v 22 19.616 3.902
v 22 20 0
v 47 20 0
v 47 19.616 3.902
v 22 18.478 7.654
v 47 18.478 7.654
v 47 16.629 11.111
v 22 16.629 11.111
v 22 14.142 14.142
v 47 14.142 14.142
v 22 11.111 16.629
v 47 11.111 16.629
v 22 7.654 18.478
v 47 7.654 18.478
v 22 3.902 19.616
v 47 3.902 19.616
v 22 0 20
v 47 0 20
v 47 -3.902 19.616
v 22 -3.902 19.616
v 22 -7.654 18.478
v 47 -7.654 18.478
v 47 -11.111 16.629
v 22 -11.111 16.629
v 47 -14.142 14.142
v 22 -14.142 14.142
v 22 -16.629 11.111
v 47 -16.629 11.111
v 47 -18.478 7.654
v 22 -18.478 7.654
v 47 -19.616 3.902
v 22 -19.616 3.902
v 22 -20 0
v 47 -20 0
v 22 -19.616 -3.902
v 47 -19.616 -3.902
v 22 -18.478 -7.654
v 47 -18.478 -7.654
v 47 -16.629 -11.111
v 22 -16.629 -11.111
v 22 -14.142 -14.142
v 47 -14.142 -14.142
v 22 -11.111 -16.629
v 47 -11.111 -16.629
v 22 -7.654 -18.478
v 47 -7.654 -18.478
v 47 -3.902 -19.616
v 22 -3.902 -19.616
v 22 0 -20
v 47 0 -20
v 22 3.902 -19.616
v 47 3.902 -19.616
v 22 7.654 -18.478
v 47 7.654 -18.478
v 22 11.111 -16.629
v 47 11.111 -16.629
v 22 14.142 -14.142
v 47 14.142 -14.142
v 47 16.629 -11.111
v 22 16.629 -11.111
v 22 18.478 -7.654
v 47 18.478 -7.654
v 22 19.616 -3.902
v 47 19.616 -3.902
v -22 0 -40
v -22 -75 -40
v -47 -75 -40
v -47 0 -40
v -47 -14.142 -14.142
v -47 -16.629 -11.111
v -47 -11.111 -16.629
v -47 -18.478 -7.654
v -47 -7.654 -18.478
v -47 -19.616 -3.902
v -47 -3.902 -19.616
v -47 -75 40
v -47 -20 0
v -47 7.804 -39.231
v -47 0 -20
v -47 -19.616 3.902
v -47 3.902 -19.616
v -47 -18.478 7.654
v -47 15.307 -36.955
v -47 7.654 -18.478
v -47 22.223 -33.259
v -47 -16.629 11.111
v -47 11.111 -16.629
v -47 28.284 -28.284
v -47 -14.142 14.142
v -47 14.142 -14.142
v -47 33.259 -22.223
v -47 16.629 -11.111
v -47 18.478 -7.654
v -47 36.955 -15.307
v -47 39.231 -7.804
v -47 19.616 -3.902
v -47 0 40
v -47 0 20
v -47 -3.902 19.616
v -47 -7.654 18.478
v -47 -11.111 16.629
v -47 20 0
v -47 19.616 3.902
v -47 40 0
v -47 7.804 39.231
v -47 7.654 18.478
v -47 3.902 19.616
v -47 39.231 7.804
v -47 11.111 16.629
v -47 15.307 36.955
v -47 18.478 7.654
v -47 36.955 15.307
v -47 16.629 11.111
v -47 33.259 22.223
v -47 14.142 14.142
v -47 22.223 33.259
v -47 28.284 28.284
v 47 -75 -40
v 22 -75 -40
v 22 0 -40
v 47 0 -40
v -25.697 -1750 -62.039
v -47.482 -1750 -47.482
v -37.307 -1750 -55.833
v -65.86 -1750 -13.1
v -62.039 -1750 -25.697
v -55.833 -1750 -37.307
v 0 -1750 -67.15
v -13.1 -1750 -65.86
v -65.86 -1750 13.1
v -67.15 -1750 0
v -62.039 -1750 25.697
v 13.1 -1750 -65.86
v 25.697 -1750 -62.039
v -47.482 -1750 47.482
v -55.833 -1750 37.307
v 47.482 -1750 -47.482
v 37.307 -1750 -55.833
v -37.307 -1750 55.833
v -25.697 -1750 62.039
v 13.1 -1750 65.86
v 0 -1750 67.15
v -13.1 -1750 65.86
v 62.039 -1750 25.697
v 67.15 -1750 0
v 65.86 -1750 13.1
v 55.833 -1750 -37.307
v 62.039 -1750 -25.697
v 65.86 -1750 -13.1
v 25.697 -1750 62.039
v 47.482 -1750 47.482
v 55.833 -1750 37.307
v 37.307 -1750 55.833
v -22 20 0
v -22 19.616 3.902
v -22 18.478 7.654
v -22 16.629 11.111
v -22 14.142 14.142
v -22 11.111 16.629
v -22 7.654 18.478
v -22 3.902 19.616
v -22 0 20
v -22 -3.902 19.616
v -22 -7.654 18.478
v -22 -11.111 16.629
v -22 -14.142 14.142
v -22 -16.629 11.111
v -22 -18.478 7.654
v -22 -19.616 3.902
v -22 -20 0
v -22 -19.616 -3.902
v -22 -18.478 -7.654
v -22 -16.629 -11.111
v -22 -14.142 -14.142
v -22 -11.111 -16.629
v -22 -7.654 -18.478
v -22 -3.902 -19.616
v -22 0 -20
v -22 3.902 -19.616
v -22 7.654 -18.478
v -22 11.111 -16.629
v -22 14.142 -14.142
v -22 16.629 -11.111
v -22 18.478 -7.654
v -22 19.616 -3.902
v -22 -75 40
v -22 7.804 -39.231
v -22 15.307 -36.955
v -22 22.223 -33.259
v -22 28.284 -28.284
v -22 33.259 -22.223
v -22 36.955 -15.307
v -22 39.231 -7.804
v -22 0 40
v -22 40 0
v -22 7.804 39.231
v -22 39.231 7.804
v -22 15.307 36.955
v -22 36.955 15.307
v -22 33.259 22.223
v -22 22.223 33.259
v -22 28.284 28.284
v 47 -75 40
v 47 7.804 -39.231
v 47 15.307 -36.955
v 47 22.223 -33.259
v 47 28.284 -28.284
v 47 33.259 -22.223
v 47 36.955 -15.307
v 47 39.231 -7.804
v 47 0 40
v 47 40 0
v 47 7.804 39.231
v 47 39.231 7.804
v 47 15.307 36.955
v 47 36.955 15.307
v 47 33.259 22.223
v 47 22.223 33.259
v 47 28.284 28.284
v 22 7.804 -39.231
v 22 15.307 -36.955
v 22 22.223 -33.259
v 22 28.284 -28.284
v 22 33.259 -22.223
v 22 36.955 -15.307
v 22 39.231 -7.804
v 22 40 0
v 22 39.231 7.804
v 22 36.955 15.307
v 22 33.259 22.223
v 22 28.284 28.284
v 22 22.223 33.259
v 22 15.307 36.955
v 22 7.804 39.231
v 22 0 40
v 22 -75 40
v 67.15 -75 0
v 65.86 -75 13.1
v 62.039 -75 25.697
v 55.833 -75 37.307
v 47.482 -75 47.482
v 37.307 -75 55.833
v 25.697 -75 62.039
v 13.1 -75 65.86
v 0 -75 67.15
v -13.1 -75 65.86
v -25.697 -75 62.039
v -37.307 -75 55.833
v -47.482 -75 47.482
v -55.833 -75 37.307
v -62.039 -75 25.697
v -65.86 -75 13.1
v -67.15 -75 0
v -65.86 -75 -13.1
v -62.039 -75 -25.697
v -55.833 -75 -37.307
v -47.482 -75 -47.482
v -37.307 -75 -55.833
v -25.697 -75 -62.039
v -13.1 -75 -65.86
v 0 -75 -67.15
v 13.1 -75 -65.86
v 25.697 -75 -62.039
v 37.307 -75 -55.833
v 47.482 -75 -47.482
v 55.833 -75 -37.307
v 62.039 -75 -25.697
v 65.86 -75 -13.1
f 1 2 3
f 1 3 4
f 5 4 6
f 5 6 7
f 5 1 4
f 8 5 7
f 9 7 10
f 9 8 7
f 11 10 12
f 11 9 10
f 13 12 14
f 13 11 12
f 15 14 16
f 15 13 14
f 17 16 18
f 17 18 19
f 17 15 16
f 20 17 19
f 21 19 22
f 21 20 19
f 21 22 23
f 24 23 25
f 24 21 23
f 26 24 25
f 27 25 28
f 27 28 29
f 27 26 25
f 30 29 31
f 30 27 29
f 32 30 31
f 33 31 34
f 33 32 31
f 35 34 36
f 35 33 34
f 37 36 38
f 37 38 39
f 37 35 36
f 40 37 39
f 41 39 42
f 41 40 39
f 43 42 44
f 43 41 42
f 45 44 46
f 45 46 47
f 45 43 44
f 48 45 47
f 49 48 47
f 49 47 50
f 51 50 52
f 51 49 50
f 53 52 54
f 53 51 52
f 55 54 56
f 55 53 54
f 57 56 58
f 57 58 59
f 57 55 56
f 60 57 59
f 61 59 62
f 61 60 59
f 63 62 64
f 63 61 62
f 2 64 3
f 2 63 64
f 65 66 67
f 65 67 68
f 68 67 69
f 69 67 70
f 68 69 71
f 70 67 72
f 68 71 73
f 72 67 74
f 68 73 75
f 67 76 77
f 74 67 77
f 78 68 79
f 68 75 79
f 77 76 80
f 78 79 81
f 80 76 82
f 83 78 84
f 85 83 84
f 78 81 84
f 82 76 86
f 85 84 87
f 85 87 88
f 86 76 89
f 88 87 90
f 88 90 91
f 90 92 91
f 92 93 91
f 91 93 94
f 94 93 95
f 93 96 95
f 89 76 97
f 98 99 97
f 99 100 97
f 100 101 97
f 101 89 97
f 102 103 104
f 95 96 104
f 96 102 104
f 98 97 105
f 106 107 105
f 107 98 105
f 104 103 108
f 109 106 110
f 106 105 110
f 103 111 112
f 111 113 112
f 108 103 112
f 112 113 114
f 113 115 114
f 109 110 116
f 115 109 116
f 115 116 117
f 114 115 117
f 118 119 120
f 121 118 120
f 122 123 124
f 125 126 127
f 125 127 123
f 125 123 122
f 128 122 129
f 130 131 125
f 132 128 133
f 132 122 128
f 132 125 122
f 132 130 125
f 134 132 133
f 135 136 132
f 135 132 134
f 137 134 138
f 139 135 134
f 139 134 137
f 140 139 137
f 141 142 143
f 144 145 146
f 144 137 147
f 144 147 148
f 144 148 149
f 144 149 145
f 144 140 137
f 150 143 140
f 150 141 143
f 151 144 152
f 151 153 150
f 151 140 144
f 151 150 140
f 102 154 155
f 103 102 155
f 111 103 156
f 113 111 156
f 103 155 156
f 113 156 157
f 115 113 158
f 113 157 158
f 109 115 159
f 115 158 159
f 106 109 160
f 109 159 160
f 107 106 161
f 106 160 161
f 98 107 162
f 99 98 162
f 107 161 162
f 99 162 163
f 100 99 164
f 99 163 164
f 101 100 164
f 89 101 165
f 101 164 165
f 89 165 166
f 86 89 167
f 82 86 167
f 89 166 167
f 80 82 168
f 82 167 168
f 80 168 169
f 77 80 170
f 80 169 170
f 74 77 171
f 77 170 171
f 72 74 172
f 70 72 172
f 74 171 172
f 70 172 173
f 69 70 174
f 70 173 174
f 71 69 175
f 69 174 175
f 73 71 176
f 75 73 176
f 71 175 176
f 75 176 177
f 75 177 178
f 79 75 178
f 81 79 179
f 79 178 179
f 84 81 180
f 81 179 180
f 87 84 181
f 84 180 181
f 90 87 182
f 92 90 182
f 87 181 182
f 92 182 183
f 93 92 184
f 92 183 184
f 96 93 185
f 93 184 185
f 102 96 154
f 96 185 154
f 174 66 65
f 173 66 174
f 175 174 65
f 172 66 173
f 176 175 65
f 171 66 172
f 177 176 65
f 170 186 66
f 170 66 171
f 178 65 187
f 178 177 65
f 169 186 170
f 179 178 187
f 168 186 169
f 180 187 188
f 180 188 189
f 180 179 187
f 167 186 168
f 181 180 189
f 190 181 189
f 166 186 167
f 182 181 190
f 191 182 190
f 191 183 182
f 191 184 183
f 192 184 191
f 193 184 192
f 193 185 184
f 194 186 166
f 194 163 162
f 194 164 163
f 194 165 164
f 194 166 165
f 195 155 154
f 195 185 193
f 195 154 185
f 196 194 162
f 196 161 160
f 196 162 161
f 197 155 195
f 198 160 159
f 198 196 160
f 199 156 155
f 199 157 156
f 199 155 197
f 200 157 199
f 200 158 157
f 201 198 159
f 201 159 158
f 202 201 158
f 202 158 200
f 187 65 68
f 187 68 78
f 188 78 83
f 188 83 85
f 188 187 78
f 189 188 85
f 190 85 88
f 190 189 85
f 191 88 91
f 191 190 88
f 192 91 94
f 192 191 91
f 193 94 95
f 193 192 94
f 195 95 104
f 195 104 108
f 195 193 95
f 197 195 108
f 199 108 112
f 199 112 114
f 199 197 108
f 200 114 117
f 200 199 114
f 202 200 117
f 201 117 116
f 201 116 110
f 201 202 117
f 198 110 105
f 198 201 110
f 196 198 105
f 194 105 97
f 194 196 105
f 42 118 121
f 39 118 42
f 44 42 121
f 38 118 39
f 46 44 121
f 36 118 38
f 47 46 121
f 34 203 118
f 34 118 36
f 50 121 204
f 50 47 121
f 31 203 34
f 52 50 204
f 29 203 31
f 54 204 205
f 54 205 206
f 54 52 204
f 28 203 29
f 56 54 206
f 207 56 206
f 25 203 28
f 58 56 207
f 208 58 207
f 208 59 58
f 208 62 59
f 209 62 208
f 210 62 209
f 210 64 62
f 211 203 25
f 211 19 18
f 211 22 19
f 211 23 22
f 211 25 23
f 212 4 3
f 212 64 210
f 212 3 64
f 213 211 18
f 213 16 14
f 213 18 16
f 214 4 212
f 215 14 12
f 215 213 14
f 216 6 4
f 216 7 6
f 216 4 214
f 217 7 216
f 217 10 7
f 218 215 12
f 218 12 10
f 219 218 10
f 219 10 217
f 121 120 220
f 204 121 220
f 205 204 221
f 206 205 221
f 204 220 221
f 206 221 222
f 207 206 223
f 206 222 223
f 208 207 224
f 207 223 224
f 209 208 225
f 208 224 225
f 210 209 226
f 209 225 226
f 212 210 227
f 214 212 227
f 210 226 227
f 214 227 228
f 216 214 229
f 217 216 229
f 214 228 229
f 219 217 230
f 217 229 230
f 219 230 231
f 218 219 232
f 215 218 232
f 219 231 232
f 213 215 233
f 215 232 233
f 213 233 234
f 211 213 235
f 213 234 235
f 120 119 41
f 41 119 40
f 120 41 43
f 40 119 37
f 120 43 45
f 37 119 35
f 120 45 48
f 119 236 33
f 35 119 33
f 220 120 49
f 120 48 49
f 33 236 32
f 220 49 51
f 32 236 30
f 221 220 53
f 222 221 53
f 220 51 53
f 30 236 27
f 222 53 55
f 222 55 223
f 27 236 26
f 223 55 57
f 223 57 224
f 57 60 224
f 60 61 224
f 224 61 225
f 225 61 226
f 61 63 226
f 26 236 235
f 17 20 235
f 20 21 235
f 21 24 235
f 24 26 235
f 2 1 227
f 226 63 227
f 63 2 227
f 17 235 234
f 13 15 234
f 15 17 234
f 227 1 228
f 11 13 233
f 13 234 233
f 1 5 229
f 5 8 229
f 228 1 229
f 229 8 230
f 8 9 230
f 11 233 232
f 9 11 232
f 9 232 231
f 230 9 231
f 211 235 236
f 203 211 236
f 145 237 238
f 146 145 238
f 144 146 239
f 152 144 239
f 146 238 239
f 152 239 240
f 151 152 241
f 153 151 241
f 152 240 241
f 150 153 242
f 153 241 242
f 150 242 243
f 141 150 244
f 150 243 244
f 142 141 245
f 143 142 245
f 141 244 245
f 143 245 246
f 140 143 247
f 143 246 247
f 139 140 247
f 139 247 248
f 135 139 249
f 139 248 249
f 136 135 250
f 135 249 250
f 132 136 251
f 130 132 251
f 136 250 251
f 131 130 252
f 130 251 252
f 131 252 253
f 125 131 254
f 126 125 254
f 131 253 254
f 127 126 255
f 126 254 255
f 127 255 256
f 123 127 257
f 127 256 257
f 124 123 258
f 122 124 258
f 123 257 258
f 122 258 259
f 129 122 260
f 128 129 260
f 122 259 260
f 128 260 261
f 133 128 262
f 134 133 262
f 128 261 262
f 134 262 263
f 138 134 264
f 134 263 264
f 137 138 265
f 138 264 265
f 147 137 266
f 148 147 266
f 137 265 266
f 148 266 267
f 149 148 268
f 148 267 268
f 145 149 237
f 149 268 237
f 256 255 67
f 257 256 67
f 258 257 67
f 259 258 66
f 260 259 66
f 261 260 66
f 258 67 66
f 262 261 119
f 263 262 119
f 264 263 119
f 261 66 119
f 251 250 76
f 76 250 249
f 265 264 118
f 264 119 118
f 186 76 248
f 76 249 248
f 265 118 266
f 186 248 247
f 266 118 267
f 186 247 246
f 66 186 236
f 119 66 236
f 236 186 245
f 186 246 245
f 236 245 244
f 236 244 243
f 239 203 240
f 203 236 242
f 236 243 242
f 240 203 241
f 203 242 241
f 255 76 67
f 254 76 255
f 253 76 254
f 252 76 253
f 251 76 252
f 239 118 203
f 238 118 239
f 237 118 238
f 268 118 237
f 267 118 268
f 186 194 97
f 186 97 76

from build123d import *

# Parameters (mm, degrees)
F2_R     = 20
F3_DEPTH = 25
F6_R     = 67.15
F7_DEPTH = 1675


with BuildPart() as f3:
    # F2 (on offset) → F3 (new body)
    with BuildSketch(Plane.YZ.offset(-22)):
        with BuildLine():
            Line((0, 40), (-75, 40))
            Line((-75, 40), (-75, -40))
            Line((-75, -40), (0, -40))
            ThreePointArc((0, -40), (40, 0), (0, 40))
        make_face()
        Circle(F2_R, mode=Mode.SUBTRACT)
    extrude(amount=-F3_DEPTH)


with BuildPart() as f5_1:
    # F5: instance of F3
    add(f3.part.mirror(Plane.YZ))


with BuildPart() as f3_1:
    add(f3.part)

    add(f5_1.part)  # F7 merges F5_1
    # F6 (on face) → F7 (join, through all)
    with BuildSketch(Plane.XZ.offset(75)):
        Circle(F6_R)
    extrude(amount=F7_DEPTH)


solid = f3_1.part
